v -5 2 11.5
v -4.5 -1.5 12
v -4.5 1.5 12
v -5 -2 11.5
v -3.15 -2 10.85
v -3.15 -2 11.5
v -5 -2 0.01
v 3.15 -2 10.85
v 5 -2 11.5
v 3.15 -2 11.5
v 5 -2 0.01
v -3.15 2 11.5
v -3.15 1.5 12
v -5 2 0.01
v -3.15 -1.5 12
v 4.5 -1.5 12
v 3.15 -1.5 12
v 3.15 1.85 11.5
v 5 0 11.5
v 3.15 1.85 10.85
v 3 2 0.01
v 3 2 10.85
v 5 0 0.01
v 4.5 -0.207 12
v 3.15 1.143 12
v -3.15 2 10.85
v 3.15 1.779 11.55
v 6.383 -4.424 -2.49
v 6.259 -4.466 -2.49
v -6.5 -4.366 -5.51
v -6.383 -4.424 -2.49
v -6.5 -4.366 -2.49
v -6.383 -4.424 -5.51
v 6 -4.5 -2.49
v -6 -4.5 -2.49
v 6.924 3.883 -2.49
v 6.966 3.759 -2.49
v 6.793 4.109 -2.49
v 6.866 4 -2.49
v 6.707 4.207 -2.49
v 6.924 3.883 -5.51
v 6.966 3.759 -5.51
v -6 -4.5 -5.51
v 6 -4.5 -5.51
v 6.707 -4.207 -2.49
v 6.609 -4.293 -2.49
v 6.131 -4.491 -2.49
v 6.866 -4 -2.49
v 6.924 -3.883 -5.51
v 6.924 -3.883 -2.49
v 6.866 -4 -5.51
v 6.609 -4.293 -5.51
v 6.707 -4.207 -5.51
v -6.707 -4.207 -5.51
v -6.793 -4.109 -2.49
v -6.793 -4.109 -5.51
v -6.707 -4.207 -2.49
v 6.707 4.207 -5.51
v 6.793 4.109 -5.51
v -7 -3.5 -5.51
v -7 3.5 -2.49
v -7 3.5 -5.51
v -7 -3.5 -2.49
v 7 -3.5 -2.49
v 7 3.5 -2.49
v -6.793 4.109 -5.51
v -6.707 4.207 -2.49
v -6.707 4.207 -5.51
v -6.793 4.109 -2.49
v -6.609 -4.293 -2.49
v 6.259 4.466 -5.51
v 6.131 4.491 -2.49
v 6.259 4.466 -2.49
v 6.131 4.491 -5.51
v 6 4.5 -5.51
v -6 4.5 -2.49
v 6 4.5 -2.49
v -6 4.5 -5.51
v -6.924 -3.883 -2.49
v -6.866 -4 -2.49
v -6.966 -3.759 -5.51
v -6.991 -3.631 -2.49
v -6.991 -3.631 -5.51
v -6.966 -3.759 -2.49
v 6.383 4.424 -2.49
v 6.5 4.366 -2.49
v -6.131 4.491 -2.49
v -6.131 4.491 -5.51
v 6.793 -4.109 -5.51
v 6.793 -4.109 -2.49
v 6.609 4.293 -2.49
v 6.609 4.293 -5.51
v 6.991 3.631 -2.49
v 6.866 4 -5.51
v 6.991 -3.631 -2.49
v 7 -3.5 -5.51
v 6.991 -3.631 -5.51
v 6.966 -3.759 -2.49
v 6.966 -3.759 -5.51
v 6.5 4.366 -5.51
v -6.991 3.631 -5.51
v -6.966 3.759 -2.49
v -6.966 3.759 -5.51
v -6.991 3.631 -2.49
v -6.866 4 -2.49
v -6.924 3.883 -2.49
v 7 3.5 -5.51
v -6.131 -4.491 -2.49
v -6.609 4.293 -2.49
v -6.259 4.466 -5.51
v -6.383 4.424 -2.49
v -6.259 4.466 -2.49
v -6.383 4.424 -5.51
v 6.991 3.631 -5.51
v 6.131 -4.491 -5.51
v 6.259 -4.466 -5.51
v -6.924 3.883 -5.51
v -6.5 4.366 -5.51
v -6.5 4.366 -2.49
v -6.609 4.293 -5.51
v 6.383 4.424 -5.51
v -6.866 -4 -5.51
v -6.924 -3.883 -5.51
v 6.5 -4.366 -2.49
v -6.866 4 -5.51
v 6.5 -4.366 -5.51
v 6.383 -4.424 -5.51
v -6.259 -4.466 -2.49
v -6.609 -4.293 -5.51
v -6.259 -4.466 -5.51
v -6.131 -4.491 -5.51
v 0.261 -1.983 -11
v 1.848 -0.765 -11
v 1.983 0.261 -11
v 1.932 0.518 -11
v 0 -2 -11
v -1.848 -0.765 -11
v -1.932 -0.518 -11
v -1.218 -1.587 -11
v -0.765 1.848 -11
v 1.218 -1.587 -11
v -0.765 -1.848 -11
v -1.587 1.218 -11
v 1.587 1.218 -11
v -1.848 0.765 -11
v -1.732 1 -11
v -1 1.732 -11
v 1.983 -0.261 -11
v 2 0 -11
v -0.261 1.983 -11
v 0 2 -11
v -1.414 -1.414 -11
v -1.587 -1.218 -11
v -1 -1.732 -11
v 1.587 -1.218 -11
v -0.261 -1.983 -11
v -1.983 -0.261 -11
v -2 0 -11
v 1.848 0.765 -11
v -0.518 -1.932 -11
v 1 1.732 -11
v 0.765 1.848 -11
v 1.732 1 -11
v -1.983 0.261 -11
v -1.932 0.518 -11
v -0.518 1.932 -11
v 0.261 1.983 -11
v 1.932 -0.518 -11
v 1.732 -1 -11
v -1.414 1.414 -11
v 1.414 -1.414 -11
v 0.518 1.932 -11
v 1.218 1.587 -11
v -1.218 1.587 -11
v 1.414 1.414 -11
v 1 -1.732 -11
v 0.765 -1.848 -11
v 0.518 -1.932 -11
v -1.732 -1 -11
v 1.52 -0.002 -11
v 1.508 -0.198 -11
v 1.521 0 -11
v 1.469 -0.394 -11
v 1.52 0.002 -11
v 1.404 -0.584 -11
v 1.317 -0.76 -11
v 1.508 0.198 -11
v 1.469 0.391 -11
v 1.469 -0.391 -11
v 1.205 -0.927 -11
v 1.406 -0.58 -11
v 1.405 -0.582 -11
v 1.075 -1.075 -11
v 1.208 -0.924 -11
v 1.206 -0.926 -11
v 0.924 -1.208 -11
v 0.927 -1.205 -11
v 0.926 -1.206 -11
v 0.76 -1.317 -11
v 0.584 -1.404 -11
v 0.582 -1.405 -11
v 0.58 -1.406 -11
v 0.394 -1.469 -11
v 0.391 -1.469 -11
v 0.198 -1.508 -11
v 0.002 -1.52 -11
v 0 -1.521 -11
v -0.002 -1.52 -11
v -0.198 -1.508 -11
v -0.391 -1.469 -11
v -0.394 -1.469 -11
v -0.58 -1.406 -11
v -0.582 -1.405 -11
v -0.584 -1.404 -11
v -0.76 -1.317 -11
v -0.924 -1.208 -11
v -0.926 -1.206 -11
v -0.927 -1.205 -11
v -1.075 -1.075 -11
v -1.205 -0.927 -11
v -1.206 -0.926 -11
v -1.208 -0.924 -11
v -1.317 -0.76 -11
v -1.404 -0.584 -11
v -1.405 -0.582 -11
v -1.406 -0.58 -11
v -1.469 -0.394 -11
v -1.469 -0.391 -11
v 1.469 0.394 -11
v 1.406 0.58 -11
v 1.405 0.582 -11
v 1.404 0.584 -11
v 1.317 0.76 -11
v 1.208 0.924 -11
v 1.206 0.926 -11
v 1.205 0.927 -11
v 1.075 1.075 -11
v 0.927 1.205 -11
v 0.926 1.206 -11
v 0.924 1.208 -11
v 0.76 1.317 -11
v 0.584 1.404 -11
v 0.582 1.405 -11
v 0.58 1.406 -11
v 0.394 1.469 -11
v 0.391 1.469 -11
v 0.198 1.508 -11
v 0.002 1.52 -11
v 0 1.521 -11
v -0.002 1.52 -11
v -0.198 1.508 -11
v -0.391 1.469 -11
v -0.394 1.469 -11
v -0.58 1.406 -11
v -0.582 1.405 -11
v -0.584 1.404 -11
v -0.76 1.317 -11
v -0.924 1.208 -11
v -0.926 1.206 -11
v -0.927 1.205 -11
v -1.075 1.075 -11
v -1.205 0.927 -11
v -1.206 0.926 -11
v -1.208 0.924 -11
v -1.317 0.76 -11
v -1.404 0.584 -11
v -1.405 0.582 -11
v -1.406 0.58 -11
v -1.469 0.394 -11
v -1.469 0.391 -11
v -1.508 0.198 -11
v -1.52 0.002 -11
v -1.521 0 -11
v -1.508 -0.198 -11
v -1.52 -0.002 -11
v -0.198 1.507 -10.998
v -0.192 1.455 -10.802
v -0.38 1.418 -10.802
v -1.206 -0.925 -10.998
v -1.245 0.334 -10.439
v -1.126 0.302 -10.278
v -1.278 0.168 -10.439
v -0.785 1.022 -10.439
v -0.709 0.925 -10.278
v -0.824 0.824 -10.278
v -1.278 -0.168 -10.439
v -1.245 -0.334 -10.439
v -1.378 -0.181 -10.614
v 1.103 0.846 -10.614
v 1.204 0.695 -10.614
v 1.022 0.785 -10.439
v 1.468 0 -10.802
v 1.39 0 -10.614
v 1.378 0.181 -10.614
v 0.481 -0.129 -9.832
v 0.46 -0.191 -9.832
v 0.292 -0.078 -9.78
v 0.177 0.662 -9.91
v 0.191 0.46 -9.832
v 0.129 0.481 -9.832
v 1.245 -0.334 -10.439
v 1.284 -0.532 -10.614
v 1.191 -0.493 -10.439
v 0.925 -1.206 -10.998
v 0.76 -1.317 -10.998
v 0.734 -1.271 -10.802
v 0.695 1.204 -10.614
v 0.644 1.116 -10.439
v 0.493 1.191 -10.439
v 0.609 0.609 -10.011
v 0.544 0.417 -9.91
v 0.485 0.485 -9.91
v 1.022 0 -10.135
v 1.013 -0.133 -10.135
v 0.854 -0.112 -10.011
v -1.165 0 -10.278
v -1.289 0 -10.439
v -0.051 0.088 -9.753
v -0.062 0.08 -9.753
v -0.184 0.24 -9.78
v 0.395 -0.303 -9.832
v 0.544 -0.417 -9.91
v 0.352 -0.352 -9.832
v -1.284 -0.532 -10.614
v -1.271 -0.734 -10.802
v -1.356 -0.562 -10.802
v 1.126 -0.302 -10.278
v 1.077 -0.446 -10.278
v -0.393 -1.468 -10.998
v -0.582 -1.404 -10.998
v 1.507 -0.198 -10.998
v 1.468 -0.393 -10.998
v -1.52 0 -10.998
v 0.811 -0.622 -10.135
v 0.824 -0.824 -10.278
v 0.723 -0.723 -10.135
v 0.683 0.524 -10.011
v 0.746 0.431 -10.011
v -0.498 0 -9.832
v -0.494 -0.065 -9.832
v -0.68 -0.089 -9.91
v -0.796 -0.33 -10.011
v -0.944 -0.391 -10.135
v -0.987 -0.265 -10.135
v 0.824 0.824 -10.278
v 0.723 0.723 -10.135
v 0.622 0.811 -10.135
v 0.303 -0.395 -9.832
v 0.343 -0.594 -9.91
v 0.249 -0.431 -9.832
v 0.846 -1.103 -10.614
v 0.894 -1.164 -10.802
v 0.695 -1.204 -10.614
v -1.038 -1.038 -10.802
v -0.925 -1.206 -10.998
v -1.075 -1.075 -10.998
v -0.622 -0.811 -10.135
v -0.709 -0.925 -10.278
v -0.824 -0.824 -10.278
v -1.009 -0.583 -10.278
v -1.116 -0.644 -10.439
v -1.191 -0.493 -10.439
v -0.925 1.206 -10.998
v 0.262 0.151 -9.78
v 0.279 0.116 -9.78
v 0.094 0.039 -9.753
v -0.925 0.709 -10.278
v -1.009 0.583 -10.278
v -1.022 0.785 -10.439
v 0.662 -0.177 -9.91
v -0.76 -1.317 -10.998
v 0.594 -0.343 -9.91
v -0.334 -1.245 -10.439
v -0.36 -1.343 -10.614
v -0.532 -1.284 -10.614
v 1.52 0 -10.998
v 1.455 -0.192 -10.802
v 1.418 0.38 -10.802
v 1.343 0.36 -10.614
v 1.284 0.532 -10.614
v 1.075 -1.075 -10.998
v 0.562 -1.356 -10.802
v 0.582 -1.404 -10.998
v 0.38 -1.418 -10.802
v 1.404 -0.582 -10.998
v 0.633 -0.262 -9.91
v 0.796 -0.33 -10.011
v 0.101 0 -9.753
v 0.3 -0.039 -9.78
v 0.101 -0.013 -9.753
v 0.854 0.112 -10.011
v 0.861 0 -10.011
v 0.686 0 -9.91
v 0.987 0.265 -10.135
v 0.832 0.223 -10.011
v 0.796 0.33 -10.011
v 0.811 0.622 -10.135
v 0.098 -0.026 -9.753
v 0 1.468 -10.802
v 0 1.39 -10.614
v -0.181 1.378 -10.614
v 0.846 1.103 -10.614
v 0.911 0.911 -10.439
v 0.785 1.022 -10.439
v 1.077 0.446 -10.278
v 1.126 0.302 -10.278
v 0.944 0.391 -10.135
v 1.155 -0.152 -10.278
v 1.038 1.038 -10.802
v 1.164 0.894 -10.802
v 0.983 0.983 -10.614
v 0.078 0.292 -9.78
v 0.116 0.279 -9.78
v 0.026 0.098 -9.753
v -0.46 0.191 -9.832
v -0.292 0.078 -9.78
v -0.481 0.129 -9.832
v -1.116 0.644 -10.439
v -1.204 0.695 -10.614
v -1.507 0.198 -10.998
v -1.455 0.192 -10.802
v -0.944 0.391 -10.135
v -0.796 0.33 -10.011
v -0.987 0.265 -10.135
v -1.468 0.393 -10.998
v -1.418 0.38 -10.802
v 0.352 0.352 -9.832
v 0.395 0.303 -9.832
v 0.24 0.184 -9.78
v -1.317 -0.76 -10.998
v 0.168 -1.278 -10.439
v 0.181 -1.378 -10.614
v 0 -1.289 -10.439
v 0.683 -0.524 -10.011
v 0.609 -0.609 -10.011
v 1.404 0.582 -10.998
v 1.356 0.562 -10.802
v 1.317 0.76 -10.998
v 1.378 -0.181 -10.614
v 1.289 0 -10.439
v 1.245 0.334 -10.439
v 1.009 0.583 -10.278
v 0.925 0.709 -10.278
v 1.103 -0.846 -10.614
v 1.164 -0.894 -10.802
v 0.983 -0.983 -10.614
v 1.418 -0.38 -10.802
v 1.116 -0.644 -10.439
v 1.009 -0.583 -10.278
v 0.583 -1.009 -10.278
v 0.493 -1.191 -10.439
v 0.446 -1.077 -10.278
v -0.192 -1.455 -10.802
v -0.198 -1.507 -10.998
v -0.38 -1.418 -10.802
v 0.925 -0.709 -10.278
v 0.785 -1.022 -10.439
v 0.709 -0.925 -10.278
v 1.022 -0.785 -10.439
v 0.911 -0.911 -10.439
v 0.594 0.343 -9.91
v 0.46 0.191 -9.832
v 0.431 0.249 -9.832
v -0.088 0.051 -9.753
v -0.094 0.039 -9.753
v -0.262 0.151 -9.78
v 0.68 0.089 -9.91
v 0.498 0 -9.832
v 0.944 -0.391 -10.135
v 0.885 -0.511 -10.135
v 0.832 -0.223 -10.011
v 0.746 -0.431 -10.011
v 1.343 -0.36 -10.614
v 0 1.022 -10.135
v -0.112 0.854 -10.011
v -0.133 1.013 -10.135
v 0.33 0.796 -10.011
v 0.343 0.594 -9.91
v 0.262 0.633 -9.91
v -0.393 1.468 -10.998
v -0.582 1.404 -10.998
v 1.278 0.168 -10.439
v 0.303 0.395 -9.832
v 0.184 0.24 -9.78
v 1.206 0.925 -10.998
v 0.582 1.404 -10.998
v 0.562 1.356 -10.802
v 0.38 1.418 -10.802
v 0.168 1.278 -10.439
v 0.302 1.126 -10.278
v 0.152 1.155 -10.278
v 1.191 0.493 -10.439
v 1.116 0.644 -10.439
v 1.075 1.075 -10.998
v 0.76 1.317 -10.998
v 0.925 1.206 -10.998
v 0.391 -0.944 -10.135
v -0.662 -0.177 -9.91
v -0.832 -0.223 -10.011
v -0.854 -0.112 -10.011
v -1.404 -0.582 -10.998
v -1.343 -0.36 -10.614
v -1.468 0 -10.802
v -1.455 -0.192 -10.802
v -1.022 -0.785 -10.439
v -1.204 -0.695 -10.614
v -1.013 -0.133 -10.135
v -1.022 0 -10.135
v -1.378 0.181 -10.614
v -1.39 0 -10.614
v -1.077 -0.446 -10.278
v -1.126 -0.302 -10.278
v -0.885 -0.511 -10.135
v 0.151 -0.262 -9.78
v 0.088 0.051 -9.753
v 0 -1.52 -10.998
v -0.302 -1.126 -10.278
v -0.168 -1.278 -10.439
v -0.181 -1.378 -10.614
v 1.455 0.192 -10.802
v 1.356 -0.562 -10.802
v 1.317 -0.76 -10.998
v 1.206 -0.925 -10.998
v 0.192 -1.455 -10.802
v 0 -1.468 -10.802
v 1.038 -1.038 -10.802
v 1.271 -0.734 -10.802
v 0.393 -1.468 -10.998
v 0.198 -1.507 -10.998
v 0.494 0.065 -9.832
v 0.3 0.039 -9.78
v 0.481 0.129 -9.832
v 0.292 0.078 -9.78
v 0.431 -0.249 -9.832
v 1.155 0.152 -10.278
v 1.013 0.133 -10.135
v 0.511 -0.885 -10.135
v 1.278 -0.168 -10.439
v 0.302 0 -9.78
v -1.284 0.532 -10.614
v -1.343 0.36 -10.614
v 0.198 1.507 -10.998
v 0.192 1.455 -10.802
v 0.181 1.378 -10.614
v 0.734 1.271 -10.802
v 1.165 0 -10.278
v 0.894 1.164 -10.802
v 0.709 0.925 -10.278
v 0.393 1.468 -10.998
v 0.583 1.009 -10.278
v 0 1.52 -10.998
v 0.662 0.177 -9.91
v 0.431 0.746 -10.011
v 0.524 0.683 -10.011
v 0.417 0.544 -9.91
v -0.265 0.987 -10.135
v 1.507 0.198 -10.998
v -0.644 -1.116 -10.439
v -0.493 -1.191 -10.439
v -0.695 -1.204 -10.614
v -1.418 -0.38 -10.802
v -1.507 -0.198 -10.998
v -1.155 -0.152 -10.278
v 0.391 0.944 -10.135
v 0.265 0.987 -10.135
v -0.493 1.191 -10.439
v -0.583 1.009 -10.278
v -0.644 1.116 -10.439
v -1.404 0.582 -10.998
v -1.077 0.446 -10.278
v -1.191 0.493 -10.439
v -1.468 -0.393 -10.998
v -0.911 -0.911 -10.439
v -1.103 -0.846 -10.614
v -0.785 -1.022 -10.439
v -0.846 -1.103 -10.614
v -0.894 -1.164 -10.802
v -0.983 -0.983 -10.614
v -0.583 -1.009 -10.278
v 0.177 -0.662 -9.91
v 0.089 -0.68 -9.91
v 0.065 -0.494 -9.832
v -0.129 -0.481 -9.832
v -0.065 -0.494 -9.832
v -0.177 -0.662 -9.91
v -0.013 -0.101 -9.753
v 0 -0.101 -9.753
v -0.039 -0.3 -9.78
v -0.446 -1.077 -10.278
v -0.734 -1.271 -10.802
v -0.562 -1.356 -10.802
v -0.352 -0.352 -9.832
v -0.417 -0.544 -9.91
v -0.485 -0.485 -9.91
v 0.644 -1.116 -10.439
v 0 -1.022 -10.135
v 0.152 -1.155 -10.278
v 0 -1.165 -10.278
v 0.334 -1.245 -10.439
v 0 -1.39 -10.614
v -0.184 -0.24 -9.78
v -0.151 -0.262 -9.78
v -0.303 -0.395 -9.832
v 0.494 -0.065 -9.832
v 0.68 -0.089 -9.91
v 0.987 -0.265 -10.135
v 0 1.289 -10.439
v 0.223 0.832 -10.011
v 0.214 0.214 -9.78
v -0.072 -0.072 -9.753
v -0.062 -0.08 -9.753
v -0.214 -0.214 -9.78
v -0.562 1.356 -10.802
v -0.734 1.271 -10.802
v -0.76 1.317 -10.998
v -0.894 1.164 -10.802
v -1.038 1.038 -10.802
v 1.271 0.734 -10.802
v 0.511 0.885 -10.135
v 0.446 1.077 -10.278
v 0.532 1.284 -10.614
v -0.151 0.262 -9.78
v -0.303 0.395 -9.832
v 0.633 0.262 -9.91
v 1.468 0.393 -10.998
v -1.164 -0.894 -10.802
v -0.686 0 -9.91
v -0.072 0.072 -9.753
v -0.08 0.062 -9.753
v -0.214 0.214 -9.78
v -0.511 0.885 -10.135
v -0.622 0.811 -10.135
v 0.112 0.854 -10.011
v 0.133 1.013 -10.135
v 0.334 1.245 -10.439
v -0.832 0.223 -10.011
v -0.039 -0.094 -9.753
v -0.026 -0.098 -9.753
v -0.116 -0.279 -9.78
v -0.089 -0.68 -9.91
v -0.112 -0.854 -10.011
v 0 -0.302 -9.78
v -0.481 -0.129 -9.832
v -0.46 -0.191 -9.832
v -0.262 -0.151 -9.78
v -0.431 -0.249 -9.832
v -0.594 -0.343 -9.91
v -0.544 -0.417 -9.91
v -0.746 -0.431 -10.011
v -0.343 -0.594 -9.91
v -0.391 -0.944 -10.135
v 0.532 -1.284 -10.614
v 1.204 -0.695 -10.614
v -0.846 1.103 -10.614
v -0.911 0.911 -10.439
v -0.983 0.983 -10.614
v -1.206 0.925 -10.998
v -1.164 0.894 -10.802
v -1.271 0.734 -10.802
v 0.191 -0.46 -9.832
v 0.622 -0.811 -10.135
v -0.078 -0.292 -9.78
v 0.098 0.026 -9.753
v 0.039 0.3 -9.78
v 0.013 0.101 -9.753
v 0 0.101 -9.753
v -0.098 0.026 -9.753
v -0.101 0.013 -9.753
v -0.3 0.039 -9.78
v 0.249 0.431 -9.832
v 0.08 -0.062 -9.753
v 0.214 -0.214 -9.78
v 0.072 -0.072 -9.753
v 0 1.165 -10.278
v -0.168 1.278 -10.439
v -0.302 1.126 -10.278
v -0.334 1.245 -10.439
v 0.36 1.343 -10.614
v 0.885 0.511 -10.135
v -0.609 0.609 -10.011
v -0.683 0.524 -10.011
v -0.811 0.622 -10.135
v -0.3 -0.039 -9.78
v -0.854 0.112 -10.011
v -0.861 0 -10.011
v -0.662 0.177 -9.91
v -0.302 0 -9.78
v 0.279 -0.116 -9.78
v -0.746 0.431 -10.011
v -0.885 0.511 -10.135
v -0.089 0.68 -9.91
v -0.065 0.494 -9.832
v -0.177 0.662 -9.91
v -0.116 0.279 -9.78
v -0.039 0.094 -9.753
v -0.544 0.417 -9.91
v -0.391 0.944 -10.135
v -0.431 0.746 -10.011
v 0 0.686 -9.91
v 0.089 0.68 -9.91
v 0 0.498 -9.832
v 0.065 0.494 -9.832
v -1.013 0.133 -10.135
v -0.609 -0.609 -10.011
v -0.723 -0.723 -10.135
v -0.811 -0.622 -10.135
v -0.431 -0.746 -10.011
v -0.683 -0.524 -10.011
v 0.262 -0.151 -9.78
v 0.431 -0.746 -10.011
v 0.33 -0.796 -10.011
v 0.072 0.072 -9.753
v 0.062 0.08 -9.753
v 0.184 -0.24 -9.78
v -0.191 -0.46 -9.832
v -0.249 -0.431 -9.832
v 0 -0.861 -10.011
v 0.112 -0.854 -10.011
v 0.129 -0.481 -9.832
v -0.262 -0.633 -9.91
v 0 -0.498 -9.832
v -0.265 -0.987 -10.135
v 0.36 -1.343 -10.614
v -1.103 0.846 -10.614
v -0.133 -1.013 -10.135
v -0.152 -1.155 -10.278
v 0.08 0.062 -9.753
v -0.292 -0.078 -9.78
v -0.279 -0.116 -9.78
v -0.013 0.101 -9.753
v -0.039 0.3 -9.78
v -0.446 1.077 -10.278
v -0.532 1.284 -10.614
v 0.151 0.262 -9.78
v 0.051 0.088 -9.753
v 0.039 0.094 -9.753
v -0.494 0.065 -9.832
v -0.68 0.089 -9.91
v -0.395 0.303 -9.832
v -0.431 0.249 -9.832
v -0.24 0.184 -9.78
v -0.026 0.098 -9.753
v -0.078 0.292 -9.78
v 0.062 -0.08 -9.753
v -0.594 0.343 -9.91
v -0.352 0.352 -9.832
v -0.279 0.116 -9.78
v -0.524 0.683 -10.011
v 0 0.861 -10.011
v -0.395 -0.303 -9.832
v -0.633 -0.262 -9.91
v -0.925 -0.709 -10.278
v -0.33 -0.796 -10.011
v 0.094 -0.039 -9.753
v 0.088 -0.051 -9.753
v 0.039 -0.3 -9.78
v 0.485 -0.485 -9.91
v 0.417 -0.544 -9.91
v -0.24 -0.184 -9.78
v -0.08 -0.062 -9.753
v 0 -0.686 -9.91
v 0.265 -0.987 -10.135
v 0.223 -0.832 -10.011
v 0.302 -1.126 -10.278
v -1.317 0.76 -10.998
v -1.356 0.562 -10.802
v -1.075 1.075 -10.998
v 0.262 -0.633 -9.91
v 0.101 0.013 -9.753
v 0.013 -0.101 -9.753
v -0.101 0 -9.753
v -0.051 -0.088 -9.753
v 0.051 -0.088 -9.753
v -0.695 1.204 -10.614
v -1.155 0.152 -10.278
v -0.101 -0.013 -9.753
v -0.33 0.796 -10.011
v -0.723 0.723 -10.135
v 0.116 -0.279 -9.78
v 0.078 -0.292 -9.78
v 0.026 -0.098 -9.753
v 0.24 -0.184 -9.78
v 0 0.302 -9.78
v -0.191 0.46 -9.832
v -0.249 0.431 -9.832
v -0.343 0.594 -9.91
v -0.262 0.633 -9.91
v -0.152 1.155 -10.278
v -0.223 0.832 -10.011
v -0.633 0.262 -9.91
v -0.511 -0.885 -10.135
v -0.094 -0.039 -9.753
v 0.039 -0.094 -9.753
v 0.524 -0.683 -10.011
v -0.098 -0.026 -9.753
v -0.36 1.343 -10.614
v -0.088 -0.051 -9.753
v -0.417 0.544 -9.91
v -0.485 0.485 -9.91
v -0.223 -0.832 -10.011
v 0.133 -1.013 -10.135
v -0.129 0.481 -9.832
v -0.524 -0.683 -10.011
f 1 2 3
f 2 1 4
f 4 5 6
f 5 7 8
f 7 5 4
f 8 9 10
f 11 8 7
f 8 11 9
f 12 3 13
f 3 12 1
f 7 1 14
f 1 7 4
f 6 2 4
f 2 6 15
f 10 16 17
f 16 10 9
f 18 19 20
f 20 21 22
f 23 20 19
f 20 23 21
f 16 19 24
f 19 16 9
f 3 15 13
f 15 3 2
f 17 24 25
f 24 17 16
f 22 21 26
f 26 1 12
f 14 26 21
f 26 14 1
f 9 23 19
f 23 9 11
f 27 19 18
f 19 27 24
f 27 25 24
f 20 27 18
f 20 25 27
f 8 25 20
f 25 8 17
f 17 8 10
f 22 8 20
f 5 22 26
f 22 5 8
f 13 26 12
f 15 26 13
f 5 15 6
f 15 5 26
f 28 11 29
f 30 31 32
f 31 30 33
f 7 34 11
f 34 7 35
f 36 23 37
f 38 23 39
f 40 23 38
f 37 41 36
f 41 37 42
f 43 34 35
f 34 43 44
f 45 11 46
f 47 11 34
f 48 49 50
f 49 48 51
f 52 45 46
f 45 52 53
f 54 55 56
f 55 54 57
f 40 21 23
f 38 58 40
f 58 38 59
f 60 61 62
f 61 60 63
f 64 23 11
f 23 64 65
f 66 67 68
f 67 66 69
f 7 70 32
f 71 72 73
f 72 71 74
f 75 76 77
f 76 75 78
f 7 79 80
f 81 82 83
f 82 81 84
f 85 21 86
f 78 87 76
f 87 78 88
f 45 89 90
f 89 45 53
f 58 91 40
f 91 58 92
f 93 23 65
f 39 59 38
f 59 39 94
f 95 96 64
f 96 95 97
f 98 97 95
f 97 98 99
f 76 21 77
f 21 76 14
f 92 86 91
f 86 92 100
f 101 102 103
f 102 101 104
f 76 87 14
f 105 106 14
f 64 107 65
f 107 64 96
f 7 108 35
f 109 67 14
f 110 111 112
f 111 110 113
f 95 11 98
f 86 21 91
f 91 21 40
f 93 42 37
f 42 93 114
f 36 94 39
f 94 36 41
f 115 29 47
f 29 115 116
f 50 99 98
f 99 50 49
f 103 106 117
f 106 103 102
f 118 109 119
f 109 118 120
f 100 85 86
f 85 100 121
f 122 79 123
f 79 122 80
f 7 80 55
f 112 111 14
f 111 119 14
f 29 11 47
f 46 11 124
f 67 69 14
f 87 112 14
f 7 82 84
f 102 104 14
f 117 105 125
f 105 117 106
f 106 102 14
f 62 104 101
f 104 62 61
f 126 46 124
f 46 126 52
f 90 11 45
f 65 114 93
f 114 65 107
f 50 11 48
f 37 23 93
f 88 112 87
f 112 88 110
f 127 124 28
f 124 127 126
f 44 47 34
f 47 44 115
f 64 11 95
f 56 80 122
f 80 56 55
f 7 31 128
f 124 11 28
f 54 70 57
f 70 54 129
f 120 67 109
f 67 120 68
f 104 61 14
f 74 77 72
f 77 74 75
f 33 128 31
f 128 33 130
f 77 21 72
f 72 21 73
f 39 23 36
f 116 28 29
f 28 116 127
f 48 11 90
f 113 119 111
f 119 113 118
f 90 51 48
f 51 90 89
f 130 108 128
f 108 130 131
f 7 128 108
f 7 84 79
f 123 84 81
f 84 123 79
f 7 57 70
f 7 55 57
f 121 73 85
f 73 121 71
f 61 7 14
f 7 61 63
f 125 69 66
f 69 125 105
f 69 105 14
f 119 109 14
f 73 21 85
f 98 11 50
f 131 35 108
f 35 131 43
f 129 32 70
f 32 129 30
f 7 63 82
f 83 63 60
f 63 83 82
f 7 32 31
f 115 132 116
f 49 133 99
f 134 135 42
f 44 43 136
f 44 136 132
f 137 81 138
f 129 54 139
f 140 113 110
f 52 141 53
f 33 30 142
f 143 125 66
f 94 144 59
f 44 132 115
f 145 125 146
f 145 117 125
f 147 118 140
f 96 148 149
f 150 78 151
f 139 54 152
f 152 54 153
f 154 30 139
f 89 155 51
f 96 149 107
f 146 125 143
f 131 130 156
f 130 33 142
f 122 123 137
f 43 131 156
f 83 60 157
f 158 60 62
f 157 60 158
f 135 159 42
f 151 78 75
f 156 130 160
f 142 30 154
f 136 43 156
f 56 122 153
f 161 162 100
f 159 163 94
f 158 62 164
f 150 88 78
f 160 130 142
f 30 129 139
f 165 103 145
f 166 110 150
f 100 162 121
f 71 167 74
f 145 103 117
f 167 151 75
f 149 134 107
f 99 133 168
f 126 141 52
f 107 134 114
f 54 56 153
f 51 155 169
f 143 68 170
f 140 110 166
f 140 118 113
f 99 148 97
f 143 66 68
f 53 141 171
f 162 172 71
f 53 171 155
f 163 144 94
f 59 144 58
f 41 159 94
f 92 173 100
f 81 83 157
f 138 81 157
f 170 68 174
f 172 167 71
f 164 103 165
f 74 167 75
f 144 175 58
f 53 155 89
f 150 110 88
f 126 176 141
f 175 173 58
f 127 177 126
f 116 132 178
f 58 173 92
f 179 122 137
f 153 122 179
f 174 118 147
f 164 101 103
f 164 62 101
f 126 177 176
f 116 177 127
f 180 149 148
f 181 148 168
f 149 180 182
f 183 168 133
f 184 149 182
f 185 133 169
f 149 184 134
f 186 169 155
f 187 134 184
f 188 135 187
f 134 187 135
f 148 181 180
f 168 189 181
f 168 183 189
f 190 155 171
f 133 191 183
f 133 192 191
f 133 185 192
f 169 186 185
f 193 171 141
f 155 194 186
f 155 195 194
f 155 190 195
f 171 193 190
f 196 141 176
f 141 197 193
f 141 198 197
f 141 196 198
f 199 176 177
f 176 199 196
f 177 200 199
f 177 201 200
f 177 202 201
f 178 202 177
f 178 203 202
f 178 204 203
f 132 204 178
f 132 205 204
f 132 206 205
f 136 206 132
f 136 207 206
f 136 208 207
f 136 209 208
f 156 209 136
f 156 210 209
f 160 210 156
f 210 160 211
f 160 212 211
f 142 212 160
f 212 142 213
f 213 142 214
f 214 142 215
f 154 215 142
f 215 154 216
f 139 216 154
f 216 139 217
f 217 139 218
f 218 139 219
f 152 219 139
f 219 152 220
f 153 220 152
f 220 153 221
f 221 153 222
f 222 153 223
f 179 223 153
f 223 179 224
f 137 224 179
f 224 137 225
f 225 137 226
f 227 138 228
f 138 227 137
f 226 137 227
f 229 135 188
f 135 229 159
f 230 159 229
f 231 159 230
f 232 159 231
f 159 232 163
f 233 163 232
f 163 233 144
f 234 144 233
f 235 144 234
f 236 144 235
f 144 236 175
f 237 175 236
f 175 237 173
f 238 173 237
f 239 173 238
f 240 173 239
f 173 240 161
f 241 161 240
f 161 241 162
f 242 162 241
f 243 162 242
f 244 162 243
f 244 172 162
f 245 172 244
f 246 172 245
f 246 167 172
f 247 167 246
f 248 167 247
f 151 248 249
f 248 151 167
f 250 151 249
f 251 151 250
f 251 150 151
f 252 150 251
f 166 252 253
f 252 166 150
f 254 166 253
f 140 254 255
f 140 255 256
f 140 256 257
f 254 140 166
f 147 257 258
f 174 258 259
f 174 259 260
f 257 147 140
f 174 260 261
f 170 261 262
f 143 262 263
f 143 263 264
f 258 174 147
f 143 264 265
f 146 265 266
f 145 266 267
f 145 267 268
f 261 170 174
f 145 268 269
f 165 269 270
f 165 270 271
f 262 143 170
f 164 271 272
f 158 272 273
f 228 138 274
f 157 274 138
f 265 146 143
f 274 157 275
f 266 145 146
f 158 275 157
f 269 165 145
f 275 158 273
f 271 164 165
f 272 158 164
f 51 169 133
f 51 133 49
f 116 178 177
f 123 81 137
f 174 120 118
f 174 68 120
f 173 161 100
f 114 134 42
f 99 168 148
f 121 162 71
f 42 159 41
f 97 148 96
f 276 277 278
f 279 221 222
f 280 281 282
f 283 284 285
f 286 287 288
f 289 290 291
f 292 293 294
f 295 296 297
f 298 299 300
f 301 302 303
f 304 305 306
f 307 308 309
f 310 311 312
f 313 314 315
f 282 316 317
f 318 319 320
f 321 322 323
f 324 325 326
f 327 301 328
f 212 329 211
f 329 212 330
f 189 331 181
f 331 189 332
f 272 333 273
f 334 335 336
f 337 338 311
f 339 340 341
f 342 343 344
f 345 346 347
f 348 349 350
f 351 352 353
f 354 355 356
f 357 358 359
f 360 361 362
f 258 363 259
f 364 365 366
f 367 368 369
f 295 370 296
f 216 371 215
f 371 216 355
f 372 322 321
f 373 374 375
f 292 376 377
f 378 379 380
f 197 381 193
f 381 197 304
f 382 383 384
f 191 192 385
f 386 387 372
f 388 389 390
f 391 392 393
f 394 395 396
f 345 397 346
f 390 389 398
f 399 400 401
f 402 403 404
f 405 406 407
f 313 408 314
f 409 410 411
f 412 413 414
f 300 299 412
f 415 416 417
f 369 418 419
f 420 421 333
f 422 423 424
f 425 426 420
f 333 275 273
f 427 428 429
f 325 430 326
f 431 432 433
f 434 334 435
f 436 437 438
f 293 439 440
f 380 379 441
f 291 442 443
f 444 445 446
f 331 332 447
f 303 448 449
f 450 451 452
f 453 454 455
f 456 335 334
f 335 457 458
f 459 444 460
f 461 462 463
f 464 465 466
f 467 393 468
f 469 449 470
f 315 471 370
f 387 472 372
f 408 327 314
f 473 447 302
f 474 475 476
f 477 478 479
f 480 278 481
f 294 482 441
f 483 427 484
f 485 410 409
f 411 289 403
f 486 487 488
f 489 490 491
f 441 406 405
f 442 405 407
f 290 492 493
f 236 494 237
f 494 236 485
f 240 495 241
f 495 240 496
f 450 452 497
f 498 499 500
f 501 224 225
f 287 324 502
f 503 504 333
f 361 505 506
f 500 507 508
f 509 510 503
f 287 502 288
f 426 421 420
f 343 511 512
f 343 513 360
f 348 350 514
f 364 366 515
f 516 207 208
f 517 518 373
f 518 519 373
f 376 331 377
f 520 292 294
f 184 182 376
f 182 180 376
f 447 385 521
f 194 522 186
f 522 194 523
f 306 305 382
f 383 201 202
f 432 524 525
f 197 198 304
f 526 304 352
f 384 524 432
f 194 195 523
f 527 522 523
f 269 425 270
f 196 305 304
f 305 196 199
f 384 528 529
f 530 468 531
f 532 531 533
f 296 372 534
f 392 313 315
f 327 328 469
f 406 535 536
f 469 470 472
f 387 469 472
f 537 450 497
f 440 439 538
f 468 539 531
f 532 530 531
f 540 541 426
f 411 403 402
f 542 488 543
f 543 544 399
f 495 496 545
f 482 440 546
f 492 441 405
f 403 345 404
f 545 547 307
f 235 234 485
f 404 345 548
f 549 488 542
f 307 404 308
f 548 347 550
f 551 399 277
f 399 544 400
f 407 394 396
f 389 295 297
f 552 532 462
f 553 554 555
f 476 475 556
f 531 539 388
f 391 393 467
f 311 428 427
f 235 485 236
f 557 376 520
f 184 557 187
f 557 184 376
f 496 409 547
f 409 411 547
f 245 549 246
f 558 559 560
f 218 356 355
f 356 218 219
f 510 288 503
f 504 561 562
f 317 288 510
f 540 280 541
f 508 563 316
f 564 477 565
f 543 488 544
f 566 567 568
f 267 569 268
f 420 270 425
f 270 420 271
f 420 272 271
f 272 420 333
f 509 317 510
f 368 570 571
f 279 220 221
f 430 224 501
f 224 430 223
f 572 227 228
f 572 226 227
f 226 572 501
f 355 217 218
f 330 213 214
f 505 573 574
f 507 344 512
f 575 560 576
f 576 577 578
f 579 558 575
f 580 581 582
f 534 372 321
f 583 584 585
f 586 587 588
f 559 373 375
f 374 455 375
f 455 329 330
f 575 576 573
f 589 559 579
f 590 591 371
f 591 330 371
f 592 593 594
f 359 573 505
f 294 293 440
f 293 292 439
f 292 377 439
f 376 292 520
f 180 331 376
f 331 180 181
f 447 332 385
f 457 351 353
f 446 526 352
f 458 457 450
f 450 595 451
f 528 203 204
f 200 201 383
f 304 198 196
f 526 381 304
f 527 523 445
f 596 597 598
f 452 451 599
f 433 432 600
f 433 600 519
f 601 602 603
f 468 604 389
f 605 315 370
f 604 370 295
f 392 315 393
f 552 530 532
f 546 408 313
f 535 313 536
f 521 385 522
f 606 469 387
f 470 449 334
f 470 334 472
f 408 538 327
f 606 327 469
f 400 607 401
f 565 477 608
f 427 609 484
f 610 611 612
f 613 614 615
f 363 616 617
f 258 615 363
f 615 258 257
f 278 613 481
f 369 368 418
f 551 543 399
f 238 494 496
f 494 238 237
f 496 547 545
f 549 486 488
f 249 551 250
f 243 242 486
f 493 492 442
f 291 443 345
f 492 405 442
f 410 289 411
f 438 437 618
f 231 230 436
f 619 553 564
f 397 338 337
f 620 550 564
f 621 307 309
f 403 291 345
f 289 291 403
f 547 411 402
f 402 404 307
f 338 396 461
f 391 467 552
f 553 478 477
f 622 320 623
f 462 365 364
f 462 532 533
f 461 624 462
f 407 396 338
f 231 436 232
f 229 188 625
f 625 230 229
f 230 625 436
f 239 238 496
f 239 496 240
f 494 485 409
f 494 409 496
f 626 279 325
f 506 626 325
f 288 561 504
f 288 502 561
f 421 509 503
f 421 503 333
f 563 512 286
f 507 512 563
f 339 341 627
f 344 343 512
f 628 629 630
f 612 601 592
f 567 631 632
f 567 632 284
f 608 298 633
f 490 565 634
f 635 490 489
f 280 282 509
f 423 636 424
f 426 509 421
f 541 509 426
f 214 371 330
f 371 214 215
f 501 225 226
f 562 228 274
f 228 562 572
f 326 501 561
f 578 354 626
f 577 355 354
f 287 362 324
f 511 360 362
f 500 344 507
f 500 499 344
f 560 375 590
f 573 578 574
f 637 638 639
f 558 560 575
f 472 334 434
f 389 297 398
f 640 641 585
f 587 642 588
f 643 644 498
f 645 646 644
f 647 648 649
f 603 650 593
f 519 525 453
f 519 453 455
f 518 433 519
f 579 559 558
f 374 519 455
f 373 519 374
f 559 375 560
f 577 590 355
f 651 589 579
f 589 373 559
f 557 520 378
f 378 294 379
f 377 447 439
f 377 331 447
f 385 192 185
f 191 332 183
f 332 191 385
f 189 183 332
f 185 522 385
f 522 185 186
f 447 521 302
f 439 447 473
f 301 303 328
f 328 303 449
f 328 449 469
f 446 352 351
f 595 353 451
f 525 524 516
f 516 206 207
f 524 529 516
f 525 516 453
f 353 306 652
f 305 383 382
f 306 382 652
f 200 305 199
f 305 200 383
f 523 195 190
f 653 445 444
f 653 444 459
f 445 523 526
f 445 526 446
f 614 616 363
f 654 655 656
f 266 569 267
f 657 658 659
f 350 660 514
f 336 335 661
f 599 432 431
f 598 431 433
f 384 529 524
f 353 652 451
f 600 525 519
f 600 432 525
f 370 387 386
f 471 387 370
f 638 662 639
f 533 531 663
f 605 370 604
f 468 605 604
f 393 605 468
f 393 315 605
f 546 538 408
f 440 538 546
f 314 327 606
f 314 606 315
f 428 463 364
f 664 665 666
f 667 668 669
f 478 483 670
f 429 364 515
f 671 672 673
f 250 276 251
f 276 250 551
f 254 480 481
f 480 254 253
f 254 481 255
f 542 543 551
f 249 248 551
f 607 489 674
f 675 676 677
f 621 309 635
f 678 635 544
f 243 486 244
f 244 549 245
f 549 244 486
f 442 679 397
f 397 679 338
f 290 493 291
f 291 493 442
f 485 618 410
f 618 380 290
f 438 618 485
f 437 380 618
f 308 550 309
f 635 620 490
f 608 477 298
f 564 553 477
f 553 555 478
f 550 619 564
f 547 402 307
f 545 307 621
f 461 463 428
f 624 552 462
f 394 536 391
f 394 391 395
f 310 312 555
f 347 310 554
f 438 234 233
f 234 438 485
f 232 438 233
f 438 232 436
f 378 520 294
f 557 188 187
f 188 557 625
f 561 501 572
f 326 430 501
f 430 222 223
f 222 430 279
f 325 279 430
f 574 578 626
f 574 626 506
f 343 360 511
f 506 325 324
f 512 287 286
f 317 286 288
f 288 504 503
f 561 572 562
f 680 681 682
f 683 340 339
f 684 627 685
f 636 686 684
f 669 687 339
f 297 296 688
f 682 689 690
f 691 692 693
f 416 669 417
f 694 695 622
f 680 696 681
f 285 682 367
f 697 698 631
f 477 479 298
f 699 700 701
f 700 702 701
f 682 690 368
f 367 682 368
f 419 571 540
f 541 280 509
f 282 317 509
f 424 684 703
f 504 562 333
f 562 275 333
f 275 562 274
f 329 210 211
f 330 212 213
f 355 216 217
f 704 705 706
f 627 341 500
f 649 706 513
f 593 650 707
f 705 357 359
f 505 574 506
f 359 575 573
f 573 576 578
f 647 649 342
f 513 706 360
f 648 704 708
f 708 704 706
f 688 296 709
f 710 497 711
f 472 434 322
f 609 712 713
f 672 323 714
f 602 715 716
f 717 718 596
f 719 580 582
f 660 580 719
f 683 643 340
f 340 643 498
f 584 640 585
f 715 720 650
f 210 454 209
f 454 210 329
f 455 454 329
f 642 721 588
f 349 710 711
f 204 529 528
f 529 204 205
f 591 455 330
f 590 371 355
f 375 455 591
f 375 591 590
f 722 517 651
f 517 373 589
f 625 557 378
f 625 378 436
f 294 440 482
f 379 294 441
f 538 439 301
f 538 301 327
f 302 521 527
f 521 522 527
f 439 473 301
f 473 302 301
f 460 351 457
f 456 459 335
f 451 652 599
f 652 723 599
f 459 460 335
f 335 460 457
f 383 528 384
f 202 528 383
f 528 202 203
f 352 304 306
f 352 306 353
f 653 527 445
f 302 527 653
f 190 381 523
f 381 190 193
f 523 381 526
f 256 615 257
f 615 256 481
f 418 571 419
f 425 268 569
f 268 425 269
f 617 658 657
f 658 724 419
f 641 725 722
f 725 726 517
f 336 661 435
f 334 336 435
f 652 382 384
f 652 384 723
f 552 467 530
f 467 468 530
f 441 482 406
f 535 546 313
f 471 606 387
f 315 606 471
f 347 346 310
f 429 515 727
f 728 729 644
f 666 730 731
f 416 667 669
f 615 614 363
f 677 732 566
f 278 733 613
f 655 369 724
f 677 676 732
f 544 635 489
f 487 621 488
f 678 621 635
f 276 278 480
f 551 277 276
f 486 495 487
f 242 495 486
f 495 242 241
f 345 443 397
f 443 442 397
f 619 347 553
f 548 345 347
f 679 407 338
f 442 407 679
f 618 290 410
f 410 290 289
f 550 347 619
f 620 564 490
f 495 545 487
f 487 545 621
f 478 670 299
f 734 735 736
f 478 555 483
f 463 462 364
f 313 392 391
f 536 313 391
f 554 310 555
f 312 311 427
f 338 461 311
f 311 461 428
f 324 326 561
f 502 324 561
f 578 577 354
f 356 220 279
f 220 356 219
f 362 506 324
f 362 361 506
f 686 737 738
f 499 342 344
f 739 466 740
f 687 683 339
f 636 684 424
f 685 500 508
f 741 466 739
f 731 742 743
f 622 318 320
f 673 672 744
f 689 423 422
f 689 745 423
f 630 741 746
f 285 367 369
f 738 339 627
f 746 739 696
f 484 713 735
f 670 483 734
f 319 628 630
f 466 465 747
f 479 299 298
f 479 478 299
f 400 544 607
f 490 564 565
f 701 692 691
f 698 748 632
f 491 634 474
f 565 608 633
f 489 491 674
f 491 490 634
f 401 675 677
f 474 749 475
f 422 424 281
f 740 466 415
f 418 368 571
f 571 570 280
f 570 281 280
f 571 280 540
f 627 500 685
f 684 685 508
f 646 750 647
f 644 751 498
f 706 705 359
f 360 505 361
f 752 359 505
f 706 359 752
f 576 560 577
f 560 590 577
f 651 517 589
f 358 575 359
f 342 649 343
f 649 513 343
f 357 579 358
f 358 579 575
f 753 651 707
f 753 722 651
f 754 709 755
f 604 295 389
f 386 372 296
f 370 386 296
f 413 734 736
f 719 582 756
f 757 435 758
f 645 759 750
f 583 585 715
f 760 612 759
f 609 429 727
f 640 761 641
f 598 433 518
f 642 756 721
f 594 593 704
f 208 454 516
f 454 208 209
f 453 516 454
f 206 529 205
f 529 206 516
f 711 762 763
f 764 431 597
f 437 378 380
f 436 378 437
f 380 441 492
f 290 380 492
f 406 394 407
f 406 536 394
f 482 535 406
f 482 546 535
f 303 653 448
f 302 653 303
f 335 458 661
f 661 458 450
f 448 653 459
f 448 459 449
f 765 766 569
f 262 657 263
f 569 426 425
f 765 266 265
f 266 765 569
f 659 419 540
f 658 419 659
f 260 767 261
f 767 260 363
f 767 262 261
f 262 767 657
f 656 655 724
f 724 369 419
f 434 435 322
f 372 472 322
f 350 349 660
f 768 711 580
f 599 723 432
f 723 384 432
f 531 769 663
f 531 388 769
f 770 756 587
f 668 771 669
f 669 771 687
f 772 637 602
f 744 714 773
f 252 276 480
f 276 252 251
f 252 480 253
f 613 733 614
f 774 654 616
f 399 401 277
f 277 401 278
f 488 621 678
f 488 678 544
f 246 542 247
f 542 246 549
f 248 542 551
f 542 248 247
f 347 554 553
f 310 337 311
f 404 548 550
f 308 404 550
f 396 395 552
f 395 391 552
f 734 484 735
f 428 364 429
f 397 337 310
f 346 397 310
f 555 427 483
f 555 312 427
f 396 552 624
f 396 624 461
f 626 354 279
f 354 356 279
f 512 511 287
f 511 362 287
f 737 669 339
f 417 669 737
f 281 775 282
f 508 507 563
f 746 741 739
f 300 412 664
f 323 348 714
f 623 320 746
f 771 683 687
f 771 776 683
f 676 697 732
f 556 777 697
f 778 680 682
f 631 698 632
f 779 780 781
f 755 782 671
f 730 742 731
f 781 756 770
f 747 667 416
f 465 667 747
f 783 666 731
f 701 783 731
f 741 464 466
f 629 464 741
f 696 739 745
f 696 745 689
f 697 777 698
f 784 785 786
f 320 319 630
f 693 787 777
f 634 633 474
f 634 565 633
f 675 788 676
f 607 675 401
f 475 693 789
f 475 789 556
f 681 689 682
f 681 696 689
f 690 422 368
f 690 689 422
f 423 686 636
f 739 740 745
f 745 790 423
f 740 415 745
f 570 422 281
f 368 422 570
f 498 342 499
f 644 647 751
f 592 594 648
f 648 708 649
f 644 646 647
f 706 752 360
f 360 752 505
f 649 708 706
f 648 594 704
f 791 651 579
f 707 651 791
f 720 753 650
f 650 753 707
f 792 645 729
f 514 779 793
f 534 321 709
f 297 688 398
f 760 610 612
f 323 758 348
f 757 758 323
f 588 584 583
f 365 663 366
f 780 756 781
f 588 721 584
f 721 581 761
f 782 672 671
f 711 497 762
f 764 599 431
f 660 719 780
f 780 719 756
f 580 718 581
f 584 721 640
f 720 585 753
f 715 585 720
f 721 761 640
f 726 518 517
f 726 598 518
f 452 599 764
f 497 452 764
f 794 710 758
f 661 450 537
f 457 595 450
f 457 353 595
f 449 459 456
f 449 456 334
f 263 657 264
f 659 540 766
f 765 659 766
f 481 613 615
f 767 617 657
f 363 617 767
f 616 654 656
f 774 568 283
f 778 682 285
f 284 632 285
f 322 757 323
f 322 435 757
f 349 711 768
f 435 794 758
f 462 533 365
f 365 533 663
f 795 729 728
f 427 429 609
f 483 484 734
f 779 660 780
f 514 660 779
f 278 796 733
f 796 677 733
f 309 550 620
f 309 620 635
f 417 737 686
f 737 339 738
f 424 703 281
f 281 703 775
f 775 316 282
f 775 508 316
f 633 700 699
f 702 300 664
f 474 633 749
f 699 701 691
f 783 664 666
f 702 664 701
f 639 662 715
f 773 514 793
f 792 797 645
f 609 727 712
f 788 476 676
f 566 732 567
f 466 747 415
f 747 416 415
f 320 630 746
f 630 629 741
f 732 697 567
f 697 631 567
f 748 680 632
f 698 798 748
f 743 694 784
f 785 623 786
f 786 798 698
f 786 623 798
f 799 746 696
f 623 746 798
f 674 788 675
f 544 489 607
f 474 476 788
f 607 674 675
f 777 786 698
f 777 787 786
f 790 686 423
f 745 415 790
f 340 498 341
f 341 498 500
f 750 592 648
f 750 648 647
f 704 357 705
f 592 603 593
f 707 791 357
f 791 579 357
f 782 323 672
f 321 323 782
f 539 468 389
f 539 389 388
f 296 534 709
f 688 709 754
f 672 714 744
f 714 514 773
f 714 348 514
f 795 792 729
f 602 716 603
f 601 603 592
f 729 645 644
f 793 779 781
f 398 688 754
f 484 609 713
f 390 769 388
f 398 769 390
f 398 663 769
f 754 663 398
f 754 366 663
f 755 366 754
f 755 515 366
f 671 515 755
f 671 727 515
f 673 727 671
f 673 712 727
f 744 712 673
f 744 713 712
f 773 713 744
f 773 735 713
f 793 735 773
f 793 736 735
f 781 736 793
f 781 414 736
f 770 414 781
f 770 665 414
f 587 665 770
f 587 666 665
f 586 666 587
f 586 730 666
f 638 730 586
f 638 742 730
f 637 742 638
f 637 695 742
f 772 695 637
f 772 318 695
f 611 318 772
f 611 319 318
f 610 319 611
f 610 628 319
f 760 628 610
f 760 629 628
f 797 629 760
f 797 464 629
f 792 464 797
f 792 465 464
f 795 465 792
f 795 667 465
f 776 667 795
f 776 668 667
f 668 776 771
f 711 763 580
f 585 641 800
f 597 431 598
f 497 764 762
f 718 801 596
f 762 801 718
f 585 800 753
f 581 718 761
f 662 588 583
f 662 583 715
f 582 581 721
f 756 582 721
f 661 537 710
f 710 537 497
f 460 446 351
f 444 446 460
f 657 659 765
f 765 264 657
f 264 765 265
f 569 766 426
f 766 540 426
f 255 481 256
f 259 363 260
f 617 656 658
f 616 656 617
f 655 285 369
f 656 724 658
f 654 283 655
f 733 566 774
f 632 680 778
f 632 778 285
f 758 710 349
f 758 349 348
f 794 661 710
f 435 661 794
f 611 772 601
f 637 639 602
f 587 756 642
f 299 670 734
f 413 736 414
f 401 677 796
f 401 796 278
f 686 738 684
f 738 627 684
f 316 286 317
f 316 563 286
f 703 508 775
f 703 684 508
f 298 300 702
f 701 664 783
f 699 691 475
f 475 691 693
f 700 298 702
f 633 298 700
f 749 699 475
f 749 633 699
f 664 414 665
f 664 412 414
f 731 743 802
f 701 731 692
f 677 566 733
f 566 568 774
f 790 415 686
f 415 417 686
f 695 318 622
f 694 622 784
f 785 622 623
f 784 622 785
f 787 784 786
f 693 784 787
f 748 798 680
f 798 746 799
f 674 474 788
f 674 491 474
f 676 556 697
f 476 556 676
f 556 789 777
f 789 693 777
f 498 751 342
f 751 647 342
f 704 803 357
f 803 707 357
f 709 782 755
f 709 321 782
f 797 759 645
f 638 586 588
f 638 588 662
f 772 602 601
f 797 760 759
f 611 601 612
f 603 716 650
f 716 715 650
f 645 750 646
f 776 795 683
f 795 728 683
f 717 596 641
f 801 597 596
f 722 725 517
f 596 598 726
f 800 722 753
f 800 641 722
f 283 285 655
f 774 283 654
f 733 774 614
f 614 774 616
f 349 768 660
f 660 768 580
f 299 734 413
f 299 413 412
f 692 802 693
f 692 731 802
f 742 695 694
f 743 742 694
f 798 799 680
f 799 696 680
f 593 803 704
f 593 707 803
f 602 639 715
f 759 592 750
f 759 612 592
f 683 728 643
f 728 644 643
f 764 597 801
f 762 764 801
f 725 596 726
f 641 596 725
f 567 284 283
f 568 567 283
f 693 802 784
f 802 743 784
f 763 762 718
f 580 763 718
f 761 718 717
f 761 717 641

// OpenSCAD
// =====================================================================
//  tip_H_ball.scad — SP1 tip H: 3 mm BALL — massager CONTROL tip
//  PROJECT SCRATCH · 05-engineering/cad/tips · units: mm
//  Drafted cone stem from the shoulder band to a 4 mm dia end 5.5 mm below it,
//  with a spherical cup for a 3.0 mm steel bearing ball (CA/epoxy bonded).
//  Ball lowest point z = -12.8 (comparable to the W apex at -12.5).
//  PRINTED_BALL = true prints the ball solid (sand smooth) if you have no balls.
//  Print: PETG, tang down, 0.12 mm layers.
// =====================================================================
include <tm1_tang_lib.scad>
$fn = TM1_FN;

BALL_D       = 3.0;
STEM_R       = 2.0;    // radius of the cone end
STEM_LEN     = 5.5;    // band bottom to cone end
CUP_OFFSET   = 0.3;    // ball centre below the cone end (mouth 3.04 mm > ball: drop-in, glue holds)
PRINTED_BALL = false;
CROSS_HOLE   = false;

module tip_H(ball_d = BALL_D, stem_r = STEM_R, stem_len = STEM_LEN,
             printed_ball = PRINTED_BALL, cross_hole = CROSS_HOLE) {
    z_end  = TM1_SH_BOT - stem_len;     // -11.0
    z_ball = z_end - CUP_OFFSET;        // -11.3
    tm1_tip_base(cross_hole);
    difference() {
        hull() {
            tm1_band_slab();
            translate([0, 0, z_end]) cylinder(r = stem_r, h = 0.02, $fn = TM1_FN);
        }
        if (!printed_ball)
            translate([0, 0, z_ball]) sphere(r = ball_d / 2 + 0.05, $fn = TM1_FN);
    }
    if (printed_ball)
        translate([0, 0, z_ball]) sphere(r = ball_d / 2, $fn = TM1_FN);
}

tip_H();
